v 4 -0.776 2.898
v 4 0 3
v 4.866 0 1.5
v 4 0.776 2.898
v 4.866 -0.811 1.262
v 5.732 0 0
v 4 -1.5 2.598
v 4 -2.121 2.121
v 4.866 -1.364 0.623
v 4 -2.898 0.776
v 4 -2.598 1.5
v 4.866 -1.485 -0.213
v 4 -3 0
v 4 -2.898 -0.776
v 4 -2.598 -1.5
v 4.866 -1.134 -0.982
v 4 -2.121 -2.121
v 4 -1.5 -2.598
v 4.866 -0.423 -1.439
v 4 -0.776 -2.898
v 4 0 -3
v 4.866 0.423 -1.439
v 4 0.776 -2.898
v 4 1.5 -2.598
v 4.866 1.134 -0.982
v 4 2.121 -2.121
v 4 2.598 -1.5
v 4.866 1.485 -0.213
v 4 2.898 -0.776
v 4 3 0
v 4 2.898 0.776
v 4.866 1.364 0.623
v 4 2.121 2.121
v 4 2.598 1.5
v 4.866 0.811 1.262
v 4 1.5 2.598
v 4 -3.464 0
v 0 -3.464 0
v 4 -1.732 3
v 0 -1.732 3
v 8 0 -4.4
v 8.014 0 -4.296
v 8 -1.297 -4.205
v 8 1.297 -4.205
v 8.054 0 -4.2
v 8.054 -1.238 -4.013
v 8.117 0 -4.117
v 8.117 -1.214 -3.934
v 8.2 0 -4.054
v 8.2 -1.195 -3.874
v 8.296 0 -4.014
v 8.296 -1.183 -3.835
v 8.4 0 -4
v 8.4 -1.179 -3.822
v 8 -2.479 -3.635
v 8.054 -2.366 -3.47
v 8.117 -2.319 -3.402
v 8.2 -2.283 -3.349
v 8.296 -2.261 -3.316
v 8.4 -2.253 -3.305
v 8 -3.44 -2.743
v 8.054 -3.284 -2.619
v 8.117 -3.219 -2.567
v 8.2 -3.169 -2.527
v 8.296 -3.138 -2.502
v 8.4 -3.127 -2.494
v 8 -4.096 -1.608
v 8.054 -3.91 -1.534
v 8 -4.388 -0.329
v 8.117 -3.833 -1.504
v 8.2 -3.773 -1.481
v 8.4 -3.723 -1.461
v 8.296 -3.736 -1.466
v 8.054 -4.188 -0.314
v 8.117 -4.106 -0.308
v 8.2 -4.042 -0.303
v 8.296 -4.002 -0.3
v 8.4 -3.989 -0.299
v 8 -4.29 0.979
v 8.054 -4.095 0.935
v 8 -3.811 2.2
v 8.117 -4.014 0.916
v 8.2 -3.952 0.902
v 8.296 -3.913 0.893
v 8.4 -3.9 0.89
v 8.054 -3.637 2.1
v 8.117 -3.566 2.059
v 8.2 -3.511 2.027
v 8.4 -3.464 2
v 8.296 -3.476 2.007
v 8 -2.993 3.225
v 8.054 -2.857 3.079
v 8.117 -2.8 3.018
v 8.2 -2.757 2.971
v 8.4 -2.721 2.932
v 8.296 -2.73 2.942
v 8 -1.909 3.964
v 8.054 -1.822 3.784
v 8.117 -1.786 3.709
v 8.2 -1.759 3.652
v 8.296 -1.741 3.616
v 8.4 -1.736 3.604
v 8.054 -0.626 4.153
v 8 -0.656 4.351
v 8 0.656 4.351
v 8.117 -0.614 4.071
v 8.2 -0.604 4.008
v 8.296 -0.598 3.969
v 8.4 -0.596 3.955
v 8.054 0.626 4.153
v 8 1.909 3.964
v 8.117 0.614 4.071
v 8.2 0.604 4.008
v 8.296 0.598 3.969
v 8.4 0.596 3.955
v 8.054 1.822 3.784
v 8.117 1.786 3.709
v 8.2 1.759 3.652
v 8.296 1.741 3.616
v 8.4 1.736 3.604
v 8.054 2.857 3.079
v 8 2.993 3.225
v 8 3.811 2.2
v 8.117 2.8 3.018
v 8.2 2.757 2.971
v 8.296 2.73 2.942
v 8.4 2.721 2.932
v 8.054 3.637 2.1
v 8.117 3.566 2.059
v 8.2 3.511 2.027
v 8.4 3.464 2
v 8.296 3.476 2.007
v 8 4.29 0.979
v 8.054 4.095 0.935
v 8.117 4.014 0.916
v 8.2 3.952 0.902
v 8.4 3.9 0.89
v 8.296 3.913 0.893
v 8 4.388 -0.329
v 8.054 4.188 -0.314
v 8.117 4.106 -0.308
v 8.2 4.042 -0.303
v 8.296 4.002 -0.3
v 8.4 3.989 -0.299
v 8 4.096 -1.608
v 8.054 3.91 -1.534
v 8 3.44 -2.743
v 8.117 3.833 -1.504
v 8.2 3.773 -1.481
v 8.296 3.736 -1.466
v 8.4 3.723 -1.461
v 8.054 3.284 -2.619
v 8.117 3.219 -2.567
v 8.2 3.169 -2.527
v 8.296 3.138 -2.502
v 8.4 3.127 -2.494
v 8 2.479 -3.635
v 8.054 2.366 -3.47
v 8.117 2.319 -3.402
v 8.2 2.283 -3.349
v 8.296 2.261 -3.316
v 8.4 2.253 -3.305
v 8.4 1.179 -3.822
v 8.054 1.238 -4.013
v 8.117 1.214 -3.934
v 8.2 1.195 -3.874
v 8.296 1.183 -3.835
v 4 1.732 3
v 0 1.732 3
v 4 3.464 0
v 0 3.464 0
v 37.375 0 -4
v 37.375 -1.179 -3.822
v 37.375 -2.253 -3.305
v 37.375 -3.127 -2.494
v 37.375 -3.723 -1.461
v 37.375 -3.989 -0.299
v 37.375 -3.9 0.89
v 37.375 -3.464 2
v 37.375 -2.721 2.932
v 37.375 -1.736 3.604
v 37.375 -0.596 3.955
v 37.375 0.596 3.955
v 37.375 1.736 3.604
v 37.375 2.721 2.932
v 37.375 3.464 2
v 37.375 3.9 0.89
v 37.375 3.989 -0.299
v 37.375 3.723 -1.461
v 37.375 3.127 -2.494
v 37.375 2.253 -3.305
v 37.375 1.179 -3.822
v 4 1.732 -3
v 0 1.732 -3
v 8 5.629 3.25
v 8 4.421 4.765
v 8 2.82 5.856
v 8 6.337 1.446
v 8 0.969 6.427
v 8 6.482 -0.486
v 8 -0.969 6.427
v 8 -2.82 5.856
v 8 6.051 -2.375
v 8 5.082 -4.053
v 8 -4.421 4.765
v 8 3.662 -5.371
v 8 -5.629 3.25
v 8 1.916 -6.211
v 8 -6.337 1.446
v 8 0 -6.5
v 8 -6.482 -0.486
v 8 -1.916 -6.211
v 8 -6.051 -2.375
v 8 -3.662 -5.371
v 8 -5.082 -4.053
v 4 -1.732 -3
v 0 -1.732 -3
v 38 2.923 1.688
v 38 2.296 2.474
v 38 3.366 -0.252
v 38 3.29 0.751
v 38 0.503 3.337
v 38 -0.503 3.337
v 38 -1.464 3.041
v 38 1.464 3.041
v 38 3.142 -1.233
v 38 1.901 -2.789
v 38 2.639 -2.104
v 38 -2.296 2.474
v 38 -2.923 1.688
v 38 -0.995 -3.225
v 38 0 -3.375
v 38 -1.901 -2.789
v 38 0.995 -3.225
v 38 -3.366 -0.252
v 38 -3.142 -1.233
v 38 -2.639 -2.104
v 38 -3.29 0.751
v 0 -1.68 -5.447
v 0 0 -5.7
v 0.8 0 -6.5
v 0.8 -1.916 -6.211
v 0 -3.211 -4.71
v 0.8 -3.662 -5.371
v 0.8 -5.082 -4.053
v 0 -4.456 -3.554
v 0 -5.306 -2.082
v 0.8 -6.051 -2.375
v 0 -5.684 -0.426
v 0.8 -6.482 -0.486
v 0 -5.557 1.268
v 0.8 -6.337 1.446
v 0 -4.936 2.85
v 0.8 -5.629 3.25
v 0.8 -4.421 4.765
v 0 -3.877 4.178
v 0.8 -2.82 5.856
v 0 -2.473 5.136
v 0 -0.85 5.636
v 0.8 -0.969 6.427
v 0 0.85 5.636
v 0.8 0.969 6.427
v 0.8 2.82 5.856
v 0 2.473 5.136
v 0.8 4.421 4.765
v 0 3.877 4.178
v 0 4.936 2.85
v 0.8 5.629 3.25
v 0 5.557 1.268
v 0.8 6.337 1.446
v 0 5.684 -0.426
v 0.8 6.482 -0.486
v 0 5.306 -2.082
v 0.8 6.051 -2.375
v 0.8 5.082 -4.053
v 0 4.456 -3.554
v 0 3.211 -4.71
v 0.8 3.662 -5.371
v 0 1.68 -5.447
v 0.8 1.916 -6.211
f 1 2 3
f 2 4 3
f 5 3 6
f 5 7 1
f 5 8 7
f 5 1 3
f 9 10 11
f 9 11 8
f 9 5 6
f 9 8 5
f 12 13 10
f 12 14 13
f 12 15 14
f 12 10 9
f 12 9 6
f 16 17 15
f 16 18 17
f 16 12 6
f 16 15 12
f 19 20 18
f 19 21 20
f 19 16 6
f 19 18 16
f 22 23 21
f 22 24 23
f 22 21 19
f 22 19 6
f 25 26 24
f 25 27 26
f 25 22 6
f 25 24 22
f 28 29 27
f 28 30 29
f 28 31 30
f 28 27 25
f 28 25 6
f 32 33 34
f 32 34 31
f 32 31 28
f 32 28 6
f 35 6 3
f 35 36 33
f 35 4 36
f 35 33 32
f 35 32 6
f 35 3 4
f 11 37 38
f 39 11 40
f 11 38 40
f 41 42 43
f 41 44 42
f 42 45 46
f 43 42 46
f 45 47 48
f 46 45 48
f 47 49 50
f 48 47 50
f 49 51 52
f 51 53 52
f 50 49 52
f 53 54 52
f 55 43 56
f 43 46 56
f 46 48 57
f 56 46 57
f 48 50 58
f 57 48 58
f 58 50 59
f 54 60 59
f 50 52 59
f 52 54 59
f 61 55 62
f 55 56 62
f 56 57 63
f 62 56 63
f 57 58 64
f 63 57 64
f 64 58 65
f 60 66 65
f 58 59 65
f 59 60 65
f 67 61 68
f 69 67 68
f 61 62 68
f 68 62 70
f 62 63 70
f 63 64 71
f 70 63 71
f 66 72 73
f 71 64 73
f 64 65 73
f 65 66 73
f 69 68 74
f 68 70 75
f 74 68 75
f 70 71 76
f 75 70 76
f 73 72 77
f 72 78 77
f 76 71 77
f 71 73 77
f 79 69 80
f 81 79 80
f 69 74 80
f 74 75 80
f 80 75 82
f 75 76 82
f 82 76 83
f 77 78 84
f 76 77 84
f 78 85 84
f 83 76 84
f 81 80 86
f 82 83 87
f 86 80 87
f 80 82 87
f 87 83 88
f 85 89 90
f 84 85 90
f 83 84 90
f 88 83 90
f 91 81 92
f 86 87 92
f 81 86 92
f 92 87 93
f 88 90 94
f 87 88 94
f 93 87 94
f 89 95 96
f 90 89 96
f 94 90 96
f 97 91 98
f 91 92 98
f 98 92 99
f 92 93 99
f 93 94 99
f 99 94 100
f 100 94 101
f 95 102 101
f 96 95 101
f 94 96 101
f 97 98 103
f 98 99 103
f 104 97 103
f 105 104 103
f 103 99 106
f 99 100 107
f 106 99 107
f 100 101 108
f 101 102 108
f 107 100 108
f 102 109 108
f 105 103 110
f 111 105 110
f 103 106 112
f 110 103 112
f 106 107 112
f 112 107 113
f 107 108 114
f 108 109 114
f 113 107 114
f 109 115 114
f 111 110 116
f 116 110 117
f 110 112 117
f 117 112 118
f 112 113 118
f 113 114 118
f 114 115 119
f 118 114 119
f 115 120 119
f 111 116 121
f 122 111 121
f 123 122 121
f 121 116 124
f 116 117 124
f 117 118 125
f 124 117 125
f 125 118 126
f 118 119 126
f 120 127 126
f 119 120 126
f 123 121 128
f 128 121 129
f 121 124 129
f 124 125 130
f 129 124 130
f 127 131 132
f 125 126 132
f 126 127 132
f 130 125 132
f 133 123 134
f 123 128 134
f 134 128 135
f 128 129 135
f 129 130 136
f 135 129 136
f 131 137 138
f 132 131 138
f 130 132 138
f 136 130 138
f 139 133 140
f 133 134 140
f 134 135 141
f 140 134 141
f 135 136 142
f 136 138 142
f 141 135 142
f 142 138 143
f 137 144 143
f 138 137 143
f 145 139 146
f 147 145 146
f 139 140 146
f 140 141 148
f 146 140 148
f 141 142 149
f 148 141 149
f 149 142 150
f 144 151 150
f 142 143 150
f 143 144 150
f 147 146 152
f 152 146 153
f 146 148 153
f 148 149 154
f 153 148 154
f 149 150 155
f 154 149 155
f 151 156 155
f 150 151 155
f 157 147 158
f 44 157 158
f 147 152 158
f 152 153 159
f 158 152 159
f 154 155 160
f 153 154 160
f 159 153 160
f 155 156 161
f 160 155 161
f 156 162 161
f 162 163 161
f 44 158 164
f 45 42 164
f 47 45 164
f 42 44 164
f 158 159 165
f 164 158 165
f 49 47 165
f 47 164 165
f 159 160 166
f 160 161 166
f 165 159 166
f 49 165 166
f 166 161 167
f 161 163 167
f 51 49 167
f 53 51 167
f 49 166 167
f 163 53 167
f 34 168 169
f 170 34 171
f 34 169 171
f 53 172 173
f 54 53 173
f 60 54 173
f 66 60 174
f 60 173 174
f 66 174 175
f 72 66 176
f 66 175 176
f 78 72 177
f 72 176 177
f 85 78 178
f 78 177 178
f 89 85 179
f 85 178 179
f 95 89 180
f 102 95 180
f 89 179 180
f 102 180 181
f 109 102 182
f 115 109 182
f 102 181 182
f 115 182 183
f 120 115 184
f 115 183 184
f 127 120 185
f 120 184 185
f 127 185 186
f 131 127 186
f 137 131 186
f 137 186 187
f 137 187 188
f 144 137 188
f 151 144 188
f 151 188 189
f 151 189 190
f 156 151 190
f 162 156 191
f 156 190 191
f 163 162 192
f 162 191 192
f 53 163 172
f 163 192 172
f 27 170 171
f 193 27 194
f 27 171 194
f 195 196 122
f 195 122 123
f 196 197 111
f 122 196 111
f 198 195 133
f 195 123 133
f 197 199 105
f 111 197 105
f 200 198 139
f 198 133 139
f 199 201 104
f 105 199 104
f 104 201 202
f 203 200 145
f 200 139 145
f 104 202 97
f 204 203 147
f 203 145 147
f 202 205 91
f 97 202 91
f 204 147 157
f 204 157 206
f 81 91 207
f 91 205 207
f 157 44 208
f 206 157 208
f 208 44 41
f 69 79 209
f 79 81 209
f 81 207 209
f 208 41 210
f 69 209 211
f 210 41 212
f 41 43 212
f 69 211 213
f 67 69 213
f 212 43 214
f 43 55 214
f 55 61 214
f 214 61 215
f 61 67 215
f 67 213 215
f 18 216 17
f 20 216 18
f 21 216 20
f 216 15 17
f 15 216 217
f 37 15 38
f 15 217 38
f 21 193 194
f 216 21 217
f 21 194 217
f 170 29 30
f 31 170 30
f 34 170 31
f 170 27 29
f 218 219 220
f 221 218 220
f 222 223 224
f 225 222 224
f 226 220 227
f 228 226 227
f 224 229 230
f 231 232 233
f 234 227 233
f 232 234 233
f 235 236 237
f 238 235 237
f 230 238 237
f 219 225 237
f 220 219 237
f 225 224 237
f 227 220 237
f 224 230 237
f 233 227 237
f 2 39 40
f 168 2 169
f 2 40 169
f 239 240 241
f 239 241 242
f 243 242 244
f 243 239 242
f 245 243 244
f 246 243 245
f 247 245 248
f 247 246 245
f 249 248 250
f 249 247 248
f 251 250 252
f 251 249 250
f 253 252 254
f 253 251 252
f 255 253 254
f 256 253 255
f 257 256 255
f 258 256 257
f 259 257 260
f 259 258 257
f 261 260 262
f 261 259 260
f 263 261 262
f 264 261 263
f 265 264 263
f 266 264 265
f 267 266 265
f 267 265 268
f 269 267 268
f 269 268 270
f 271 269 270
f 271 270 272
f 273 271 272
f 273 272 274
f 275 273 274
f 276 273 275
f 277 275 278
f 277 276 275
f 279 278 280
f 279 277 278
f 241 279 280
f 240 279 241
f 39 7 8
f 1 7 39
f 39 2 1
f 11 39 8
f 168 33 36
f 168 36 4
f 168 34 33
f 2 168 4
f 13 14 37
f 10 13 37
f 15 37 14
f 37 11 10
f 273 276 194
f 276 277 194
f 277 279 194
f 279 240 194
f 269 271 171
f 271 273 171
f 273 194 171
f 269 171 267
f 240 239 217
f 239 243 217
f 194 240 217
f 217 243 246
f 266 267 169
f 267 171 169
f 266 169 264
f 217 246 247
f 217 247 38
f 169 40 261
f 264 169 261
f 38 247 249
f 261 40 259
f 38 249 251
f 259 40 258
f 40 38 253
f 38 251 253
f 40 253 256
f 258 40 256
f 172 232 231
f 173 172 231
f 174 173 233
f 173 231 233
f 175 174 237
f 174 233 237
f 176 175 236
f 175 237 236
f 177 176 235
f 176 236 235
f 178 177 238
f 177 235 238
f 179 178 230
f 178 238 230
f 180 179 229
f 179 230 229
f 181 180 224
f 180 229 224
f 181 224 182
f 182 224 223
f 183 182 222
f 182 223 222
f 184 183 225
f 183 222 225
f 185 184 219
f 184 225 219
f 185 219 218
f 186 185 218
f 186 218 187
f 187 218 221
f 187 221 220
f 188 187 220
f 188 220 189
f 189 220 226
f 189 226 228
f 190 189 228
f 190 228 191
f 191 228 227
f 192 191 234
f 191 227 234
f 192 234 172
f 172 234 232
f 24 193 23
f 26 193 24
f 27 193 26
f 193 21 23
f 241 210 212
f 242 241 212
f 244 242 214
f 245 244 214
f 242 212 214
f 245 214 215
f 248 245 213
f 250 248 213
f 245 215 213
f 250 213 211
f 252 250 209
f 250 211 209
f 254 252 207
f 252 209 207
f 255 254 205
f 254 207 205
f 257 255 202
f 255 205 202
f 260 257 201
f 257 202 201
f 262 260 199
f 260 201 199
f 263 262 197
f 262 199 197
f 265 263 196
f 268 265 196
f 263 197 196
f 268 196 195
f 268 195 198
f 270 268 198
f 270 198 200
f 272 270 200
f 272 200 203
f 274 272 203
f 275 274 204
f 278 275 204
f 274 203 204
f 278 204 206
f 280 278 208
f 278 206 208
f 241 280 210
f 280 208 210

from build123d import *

# Parameters (mm, degrees)
CHAMFER1_SIZE      = 0.625
CUT_EXTRUDE1_DEPTH = 4
CHAMFER2_SIZE      = 0.8
FILLET1_R          = 0.4


with BuildPart() as part:
    # Sketch1 → Revolve1 (revolve)
    with BuildSketch(Plane(origin=(0, 0, 0), x_dir=(1, 0, 0), z_dir=(0, 1, 0))):
        Polygon((0, 0), (0, 6.5), (8, 6.5), (8, 4), (38, 4), (38, 0), align=None)
    revolve(axis=Axis((38, 0, 0), (-1, 0, 0)))

    # Chamfer1
    chamfer1_edges = [part.edges().sort_by_distance(p)[0] for p in [
        (38, 0, 4),
    ]]
    chamfer(chamfer1_edges, length=CHAMFER1_SIZE)

    # Sketch3 → Cut-Revolve1 (revolve, cut)
    with BuildSketch(Plane(origin=(0, 0, 0), x_dir=(1, 0, 0), z_dir=(0, 1, 0)), mode=Mode.PRIVATE) as cut_revolve1_sk:
        Polygon((0, 0), (5.732050808, 0), (4, 3), (0, 3), align=None)
    revolve(cut_revolve1_sk.sketch.rotate(Axis((0, 0, 0), (1, 0, 0)), 180), axis=Axis((0, 0, 0), (1, 0, 0)), mode=Mode.SUBTRACT)

    # Sketch2 → Cut-Extrude1 (cut)
    with BuildSketch(Plane.ZY):
        Polygon((0, 3.464101615), (-3, 1.732050808), (-3, -1.732050808), (0, -3.464101615), (3, -1.732050808), (3, 1.732050808), align=None)
    extrude(amount=-CUT_EXTRUDE1_DEPTH, mode=Mode.SUBTRACT)

    # Chamfer2
    chamfer2_edges = [part.edges().sort_by_distance(p)[0] for p in [
        (0, 0, 6.5),
    ]]
    chamfer(chamfer2_edges, length=CHAMFER2_SIZE)

    # Fillet1
    fillet1_edges = [part.edges().sort_by_distance(p)[0] for p in [
        (8, 0, 4),
    ]]
    fillet(fillet1_edges, radius=FILLET1_R)


solid = part.part
